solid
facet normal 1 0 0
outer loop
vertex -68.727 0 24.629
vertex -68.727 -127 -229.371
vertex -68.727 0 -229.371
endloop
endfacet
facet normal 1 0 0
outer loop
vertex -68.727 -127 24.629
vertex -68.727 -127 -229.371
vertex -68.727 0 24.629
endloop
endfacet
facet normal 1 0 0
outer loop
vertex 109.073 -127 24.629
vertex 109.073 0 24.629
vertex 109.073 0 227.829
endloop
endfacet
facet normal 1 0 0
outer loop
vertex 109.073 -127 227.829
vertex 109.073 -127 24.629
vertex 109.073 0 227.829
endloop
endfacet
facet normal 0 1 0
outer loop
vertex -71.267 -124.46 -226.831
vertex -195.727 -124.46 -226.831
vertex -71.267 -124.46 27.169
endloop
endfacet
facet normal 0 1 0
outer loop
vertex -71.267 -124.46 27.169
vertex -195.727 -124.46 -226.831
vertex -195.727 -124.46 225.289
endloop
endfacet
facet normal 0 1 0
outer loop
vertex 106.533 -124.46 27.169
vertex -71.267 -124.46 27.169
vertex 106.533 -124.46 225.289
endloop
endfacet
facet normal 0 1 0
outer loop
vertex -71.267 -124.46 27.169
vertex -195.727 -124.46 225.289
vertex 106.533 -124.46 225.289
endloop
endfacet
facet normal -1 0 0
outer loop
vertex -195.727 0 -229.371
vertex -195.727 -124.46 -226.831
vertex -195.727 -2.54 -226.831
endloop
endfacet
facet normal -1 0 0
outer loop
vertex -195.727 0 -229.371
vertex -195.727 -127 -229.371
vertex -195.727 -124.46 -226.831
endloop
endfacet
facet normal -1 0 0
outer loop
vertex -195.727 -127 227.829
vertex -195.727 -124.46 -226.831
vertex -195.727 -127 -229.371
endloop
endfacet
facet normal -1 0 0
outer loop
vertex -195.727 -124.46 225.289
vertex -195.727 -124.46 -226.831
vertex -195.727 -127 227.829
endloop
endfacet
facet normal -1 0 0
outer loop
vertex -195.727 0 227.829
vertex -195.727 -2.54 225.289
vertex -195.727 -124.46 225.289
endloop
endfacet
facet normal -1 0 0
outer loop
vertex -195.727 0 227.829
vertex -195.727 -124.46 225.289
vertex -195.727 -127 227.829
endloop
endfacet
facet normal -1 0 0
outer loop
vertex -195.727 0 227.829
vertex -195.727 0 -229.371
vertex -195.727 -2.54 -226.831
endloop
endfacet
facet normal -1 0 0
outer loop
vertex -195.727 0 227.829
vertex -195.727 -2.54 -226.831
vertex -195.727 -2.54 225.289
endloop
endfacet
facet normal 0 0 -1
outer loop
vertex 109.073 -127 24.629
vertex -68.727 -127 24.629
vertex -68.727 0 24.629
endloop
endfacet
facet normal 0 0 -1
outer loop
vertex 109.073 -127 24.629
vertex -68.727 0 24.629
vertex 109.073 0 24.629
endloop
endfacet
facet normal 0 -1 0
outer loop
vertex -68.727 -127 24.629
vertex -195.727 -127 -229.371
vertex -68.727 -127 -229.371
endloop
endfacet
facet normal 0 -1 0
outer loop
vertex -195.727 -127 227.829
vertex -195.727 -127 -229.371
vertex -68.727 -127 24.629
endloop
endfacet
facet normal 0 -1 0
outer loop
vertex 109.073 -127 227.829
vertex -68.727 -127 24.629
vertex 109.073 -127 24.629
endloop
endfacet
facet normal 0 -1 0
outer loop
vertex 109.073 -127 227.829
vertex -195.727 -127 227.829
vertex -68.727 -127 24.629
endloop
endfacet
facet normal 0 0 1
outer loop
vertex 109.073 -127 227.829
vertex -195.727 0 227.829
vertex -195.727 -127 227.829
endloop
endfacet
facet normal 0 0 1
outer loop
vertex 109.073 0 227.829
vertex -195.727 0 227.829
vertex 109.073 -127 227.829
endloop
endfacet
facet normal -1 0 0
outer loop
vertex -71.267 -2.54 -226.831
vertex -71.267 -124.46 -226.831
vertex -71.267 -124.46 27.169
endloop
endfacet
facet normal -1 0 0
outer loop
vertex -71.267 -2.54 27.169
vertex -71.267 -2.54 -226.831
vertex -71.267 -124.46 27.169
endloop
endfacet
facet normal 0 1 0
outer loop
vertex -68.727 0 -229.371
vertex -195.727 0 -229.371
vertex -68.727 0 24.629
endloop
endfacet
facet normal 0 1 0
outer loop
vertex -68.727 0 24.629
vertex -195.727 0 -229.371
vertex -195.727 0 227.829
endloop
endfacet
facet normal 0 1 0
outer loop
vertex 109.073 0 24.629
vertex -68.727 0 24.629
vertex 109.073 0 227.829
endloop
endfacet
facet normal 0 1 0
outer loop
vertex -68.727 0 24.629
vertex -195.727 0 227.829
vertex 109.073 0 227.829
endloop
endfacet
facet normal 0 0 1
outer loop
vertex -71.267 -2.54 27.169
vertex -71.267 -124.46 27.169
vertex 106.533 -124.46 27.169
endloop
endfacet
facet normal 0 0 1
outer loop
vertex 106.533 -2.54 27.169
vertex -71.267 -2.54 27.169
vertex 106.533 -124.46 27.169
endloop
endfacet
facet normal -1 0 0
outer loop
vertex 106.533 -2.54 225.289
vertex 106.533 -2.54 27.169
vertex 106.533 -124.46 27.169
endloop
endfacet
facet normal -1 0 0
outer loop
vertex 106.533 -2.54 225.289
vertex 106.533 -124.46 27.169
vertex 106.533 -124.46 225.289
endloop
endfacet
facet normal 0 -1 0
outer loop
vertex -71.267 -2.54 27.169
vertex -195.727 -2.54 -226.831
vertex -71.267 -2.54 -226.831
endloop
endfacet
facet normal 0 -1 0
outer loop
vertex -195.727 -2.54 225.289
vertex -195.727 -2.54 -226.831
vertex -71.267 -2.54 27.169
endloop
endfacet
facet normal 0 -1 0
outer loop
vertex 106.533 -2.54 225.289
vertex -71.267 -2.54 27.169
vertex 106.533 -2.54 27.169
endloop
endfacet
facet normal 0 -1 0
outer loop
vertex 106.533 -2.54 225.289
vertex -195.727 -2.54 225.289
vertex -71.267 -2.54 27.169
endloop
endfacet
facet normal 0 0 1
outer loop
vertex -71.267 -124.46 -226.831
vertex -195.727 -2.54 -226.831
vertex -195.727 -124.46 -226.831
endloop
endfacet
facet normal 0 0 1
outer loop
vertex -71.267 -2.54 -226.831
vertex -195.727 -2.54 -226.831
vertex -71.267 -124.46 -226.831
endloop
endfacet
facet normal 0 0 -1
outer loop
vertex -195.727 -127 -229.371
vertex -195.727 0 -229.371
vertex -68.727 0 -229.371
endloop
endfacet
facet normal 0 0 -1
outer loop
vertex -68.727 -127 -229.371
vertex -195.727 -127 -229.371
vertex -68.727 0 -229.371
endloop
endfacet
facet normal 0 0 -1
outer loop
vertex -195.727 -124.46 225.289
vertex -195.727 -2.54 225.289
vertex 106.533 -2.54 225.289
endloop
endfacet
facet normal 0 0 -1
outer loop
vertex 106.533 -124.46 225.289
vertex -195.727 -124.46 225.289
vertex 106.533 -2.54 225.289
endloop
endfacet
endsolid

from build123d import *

# Parameters (mm, degrees)
F0_W     = 304.8
F0_H     = 457.2
F1_DEPTH = 127
F2_W     = 177.8
F2_H     = 254
F3_DEPTH = 127
F4_T     = -2.54


with BuildPart() as f1:
    # F0 (on Front) → F1 (new body)
    with BuildSketch(Plane.XZ):
        with Locations((-43.326701003, -0.7706172764)):
            Rectangle(F0_W, F0_H)
    extrude(amount=F1_DEPTH)

    # F2 (on face) → F3 (cut)
    with BuildSketch(Plane.XZ.offset(127)):
        with Locations((20.173298997, -102.3706172764)):
            Rectangle(F2_W, F2_H)
    extrude(amount=-F3_DEPTH, mode=Mode.SUBTRACT)

    # F4
    f4_openings = [f1.faces().sort_by_distance(p)[0] for p in [
        (-195.726701, -63.5, -0.770617),
    ]]
    offset(amount=F4_T, openings=f4_openings, kind=Kind.INTERSECTION)


solid = f1.part
